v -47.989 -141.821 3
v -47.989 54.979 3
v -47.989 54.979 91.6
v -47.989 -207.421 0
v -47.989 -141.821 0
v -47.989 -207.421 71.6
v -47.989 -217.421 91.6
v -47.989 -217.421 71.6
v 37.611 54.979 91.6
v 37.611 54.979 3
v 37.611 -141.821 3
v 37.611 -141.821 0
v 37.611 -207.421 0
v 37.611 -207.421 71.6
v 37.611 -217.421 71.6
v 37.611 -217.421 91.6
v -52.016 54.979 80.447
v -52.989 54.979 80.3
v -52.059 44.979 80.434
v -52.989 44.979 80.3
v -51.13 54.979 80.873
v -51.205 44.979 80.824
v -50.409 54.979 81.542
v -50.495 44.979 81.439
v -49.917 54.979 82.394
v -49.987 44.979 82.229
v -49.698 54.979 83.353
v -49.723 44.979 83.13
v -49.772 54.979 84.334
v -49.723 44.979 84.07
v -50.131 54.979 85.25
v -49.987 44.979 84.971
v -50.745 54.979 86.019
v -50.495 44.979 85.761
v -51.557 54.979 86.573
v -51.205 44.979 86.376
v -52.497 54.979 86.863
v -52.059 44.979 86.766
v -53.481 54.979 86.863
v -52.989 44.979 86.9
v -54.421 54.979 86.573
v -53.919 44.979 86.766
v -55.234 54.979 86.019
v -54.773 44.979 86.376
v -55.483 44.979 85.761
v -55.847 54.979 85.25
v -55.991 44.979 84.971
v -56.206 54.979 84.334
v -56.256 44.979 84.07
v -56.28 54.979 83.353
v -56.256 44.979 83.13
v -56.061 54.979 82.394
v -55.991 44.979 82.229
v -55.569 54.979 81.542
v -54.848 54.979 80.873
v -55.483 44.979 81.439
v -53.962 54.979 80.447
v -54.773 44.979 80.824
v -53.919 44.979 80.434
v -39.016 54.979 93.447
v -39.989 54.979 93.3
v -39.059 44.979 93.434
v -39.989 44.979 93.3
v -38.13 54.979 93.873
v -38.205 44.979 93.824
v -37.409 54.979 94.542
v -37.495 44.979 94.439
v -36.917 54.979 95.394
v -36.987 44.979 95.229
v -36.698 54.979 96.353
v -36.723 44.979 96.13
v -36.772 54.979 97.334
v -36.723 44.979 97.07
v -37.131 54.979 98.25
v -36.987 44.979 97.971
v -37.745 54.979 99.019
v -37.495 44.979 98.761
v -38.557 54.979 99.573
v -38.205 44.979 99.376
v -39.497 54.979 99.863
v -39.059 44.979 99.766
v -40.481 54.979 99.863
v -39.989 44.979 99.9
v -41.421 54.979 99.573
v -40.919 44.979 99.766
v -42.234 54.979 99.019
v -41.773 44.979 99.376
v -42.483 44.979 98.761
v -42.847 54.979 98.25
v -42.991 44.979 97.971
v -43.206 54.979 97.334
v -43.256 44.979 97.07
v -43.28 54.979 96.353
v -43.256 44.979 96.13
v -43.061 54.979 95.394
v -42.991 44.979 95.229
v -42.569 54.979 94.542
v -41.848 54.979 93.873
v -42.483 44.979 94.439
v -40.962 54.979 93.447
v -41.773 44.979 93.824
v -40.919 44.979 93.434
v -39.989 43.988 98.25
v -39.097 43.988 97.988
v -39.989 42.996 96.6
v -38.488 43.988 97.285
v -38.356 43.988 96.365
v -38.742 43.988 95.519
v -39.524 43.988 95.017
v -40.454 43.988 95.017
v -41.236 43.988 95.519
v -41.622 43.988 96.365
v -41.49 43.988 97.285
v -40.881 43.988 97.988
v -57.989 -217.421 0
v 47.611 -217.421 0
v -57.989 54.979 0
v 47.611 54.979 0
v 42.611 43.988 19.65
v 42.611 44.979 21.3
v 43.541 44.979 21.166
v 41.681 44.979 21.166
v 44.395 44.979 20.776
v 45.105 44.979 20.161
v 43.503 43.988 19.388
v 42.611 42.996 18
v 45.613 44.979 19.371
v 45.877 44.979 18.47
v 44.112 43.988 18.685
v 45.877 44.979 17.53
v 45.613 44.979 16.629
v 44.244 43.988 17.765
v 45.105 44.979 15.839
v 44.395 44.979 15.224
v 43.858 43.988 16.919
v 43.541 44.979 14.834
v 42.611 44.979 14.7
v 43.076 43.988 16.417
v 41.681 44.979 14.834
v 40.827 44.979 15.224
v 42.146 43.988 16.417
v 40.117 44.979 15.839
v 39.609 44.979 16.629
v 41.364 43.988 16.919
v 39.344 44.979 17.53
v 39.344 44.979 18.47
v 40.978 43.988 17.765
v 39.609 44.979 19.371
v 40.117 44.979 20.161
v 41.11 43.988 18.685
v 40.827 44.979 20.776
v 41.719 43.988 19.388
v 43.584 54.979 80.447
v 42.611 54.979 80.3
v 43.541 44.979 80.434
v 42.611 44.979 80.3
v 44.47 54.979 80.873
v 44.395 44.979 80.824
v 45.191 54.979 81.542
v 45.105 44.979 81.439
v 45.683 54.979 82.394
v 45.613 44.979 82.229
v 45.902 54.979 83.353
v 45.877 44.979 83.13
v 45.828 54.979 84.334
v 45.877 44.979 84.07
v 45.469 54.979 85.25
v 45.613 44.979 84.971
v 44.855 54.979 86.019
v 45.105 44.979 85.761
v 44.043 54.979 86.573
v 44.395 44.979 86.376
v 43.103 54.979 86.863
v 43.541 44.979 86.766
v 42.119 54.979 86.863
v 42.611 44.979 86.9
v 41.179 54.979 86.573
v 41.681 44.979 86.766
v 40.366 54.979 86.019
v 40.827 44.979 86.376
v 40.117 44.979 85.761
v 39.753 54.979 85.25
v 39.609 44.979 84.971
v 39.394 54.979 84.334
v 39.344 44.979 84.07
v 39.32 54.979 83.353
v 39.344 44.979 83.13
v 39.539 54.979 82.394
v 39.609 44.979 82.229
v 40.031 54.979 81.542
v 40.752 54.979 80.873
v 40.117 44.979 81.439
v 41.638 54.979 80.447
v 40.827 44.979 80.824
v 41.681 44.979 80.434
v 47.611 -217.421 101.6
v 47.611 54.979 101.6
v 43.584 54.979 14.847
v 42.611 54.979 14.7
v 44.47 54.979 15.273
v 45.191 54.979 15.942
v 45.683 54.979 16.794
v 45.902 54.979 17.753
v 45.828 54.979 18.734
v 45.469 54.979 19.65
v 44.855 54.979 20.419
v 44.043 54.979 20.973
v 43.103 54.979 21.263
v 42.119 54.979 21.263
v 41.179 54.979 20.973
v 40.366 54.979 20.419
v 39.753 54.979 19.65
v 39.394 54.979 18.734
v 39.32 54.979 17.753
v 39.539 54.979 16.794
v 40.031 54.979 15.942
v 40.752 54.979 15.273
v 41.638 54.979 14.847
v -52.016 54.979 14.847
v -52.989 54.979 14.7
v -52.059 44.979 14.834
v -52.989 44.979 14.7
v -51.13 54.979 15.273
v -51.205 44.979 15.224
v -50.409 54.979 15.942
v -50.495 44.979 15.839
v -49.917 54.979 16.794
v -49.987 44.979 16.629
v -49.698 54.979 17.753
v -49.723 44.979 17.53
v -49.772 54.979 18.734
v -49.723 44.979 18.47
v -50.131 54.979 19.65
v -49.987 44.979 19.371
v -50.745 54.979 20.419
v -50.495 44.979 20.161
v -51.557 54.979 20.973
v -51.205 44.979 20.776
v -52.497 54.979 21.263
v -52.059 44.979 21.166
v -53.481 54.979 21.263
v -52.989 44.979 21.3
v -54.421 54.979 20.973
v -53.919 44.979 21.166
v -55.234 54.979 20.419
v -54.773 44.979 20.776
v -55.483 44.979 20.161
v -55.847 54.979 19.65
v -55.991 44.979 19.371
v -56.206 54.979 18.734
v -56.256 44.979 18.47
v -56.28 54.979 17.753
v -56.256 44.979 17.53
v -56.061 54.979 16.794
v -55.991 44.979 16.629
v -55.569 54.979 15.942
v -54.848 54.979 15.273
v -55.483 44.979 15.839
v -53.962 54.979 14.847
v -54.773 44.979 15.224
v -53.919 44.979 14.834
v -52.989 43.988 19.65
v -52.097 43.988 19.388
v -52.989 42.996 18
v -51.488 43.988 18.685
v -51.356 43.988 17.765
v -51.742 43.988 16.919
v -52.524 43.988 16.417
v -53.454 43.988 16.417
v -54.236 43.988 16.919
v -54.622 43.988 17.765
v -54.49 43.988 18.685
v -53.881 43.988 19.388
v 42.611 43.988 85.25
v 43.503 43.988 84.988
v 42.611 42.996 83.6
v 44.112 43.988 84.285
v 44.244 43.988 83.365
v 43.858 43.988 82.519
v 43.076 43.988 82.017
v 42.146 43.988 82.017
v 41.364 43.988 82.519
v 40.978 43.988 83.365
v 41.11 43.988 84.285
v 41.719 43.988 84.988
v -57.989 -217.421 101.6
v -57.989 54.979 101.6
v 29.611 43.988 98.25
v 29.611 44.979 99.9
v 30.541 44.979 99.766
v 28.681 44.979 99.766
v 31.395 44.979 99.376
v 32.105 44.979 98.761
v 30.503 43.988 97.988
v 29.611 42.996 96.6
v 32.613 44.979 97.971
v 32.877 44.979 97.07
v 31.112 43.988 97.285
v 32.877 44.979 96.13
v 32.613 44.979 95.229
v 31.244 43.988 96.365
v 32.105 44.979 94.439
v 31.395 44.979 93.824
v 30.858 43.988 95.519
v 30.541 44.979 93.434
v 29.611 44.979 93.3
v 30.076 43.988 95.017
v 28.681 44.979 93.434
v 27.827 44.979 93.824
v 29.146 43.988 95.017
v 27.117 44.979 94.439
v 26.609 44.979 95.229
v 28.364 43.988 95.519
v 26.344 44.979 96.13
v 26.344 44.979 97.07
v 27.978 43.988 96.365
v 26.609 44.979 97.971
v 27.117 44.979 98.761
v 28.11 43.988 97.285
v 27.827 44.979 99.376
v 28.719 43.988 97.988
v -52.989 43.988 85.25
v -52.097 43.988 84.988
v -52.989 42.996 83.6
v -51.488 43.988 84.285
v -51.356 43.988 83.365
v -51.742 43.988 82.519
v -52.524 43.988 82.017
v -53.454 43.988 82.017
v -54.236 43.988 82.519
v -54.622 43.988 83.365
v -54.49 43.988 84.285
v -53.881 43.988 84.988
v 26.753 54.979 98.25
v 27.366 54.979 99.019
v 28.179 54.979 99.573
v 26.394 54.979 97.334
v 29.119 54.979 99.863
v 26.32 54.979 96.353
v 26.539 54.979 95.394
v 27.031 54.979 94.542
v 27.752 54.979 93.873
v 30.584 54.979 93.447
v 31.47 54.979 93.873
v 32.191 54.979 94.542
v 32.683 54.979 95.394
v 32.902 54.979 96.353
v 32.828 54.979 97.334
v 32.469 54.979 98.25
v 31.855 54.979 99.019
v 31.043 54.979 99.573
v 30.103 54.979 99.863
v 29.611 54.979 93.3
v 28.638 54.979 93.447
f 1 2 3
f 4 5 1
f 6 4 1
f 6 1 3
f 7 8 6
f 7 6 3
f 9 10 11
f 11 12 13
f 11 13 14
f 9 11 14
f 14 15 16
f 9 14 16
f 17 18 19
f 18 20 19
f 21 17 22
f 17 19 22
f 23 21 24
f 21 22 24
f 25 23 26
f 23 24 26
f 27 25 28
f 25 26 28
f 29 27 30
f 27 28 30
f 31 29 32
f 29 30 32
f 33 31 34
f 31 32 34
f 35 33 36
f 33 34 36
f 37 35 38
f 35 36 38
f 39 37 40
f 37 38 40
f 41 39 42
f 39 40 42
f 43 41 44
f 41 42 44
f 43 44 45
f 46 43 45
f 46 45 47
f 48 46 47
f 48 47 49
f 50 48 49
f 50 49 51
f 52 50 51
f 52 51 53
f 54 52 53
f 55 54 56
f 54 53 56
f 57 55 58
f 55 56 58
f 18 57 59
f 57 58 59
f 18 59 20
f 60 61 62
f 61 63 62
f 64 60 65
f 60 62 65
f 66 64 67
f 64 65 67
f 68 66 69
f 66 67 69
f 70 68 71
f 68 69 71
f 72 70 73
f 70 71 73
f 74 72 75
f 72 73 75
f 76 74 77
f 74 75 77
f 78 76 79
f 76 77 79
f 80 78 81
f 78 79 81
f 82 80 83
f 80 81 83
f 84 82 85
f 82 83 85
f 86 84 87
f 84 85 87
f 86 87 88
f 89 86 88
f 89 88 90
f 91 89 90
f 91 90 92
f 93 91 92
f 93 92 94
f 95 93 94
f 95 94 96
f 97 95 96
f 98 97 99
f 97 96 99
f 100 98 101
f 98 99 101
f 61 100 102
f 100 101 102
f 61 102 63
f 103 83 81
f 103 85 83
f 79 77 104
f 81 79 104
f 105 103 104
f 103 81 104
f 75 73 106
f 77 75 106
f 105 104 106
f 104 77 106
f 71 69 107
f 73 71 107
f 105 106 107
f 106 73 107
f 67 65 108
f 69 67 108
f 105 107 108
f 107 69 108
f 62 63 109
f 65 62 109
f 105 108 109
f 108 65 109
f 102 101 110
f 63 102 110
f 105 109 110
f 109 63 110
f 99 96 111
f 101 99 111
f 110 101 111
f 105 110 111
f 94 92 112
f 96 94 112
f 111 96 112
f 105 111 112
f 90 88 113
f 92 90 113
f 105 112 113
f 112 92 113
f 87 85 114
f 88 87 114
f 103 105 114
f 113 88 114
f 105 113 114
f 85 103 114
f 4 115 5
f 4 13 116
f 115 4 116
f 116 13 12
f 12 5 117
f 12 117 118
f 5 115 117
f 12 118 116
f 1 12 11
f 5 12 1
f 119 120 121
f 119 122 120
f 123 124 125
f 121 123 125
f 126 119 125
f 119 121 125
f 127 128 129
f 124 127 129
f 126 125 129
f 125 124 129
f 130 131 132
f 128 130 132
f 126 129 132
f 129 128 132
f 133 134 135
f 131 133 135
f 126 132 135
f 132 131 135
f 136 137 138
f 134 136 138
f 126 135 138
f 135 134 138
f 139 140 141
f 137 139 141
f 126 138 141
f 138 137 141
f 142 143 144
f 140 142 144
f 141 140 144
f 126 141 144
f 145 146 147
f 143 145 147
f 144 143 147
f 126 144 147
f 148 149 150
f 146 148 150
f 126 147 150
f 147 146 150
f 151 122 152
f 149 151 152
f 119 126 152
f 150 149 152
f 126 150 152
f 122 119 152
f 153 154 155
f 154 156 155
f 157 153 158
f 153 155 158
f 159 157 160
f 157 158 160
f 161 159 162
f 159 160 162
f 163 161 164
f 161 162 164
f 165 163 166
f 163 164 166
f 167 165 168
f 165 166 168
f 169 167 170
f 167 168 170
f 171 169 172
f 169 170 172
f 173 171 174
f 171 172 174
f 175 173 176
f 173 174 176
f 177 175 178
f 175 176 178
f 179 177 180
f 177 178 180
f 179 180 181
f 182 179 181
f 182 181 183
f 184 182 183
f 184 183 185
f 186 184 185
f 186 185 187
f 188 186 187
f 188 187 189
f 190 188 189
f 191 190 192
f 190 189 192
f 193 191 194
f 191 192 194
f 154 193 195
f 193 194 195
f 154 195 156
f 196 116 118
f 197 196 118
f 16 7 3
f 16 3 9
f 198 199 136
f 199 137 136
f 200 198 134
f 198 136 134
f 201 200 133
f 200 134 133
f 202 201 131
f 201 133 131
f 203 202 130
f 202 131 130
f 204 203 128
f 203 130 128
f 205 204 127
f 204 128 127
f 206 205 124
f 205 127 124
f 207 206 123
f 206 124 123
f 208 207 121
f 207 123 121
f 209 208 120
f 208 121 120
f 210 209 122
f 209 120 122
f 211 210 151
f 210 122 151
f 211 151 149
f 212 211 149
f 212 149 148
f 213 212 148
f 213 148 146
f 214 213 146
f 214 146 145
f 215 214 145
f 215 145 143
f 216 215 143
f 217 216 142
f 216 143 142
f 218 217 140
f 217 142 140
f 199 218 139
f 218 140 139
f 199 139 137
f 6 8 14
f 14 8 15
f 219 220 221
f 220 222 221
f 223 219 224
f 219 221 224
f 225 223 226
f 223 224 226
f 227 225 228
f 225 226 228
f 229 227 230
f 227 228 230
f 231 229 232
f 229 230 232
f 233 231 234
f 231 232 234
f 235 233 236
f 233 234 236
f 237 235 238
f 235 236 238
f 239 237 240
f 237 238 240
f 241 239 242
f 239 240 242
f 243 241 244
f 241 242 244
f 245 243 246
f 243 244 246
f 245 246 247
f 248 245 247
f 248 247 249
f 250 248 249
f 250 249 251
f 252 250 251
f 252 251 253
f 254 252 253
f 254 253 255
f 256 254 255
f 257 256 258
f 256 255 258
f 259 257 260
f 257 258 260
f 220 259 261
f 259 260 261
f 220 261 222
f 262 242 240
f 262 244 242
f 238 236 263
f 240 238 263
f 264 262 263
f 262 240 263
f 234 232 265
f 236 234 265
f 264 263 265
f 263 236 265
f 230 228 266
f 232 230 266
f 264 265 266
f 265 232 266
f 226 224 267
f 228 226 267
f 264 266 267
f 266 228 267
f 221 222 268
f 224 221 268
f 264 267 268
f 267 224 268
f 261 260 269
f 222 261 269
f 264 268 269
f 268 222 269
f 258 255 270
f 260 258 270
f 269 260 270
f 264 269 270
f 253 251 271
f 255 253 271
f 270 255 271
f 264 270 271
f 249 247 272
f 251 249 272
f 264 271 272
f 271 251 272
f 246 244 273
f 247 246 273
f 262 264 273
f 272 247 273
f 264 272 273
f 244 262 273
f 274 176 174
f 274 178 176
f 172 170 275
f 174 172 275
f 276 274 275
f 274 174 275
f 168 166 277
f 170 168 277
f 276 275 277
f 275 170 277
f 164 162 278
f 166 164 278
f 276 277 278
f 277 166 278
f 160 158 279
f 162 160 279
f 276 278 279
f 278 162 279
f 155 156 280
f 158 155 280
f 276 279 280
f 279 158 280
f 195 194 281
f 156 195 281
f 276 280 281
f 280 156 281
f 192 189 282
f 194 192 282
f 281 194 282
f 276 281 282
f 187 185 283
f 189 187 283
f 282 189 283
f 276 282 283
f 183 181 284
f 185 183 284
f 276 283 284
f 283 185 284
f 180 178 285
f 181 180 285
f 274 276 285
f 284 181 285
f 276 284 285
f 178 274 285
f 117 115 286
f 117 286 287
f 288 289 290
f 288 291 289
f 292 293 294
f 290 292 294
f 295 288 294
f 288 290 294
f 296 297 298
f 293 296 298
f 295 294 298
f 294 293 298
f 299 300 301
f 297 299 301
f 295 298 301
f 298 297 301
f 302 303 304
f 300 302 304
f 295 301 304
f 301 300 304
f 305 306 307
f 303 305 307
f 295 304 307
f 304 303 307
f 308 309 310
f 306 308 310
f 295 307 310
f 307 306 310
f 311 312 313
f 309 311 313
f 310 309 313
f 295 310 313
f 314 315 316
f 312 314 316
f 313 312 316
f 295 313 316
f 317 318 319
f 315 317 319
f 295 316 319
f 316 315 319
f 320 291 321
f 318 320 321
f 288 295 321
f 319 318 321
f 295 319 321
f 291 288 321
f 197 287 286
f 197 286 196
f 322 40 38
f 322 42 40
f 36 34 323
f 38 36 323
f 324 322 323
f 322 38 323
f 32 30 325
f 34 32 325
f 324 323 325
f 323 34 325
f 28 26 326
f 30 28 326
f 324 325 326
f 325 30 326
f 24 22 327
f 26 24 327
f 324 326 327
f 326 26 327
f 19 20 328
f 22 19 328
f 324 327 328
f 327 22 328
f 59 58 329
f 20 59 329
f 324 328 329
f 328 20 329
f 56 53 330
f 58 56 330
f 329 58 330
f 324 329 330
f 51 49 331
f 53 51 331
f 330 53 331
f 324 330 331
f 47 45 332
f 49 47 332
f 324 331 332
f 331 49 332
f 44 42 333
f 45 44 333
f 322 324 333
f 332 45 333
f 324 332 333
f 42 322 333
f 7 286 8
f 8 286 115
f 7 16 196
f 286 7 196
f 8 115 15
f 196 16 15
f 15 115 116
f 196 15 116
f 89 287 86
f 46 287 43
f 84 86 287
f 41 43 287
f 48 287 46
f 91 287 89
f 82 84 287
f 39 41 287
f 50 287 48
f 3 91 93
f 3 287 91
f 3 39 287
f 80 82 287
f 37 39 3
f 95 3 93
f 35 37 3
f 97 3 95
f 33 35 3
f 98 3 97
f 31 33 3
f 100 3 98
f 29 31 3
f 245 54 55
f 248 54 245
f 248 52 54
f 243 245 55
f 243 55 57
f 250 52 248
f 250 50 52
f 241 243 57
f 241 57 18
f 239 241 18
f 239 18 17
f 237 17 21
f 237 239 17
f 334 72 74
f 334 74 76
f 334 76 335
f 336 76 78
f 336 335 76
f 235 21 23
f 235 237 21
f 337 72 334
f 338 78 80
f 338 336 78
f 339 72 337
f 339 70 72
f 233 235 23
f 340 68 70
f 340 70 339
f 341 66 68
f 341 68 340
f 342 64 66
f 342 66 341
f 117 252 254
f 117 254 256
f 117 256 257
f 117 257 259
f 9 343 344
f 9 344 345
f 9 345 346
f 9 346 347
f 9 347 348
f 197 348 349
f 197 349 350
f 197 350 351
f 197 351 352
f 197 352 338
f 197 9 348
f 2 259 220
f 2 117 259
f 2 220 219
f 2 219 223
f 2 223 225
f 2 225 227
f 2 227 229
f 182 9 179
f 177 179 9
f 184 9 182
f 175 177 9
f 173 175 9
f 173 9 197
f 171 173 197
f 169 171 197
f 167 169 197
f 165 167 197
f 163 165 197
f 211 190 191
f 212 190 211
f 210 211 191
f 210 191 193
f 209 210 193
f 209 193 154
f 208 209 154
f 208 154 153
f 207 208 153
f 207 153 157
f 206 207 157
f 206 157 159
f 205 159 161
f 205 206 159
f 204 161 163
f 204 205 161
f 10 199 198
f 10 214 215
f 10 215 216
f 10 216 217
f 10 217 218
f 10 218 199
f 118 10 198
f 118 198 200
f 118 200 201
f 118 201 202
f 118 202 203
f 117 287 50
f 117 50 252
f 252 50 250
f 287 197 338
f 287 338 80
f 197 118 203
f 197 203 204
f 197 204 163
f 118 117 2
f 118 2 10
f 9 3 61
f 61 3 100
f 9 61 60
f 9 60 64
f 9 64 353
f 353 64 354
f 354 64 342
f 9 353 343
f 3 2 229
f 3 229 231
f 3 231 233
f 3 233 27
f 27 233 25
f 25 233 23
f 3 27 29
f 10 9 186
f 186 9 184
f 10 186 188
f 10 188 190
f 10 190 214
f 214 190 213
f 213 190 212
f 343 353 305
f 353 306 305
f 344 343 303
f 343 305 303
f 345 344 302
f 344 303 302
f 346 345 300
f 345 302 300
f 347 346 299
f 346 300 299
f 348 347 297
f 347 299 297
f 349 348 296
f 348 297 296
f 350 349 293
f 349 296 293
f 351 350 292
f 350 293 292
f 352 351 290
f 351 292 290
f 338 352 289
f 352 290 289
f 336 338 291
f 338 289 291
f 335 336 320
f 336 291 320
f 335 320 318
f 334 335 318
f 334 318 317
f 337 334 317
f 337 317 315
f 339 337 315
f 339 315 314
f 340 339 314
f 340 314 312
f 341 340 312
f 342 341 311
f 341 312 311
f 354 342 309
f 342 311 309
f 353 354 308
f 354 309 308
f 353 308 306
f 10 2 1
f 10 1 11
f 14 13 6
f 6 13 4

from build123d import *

# Parameters (mm, degrees)
ESQUISSE1_W             = 105.6
ESQUISSE1_H             = 272.4
BOSS_EXTRU_1_DEPTH      = 101.6
ESQUISSE3_W             = 85.6
ESQUISSE3_H             = 88.6
ENL_V_MAT_EXTRU_1_DEPTH = 262.4
ESQUISSE4_W             = 85.6
ESQUISSE4_H             = 20
ENL_V_MAT_EXTRU_2_DEPTH = 30
ESQUISSE5_W             = 85.6
ESQUISSE5_H             = 65.6
ENL_V_MAT_EXTRU_3_DEPTH = 30
D_GAGEMENT_M61_D        = 6.6
D_GAGEMENT_M61_DEPTH    = 10
D_GAGEMENT_M61_TIP      = 1.982840043


with BuildPart() as part:
    # Esquisse1 → Boss.-Extru.1 (new body)
    with BuildSketch(Plane.XY):
        with Locations((-5.189173744, -81.220813953)):
            Rectangle(ESQUISSE1_W, ESQUISSE1_H)
    extrude(amount=BOSS_EXTRU_1_DEPTH)

    # Esquisse3 → Enlèv. mat.-Extru.1 (cut)
    with BuildSketch(Plane(origin=(0, 54.979186047, 0), x_dir=(1, 0, 0), z_dir=(0, 1, 0))):
        with Locations((-5.189173744, -47.3)):
            Rectangle(ESQUISSE3_W, ESQUISSE3_H)
    extrude(amount=-ENL_V_MAT_EXTRU_1_DEPTH, mode=Mode.SUBTRACT)

    # Esquisse4 → Enlèv. mat.-Extru.2 (cut)
    with BuildSketch(Plane.XZ.offset(217.420813953)):
        with Locations((-5.189173744, 81.6)):
            Rectangle(ESQUISSE4_W, ESQUISSE4_H)
    extrude(amount=-ENL_V_MAT_EXTRU_2_DEPTH, mode=Mode.SUBTRACT)

    # Esquisse5 → Enlèv. mat.-Extru.3 (cut)
    with BuildSketch(Plane(origin=(0, 0, 0), x_dir=(-1, 0, 0), z_dir=(0, 0, -1))):
        with Locations((5.189173744, -174.620813953)):
            Rectangle(ESQUISSE5_W, ESQUISSE5_H)
    extrude(amount=-ENL_V_MAT_EXTRU_3_DEPTH, mode=Mode.SUBTRACT)

    # Dégagement M61
    with Locations(Plane(origin=(-52.989173744, 54.979186047, 18), x_dir=(0, 0, 1), z_dir=(0, 1, 0))):
        with Locations((0, 0), (65.6, 0), (0, 95.6), (65.6, 95.6), (78.6, 13), (78.6, 82.6)):
            Hole(D_GAGEMENT_M61_D / 2, depth=D_GAGEMENT_M61_DEPTH)
            with Locations((0, 0, -(D_GAGEMENT_M61_DEPTH + D_GAGEMENT_M61_TIP / 2))):  # 118° drill point
                Cone(0, D_GAGEMENT_M61_D / 2, D_GAGEMENT_M61_TIP, mode=Mode.SUBTRACT)


solid = part.part
